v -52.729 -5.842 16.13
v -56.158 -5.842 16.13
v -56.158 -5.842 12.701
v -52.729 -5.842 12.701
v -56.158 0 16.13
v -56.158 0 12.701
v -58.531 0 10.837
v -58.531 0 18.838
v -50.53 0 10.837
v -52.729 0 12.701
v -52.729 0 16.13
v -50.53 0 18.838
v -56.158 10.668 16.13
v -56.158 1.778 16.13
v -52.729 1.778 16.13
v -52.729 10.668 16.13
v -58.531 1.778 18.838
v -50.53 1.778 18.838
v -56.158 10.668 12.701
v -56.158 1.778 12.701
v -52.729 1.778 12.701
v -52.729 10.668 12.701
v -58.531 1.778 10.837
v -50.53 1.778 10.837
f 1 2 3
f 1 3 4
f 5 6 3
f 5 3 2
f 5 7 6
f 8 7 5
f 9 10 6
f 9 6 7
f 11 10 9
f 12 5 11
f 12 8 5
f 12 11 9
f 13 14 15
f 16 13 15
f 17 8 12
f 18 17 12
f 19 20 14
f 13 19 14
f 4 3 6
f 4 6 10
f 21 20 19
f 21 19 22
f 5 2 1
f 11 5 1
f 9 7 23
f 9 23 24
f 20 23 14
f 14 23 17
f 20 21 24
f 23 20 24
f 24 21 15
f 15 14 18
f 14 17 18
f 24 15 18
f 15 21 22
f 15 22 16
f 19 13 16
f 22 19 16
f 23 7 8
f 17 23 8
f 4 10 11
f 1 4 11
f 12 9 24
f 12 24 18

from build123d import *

# Parameters (mm, degrees)
F0_W          = 3.429
F0_H          = 3.429
F1_DEPTH      = 5.842
F1_DEPTH_BACK = 10.668
F0_W_2        = 8.001
F0_H_2        = 8.001
F2_DEPTH      = 1.778


with BuildPart() as f1:
    # F0 (on Front) → F1 (new body, two sides)
    with BuildSketch(Plane.XZ) as f1_sk:
        with Locations((-54.44314, 14.415071)):
            Rectangle(F0_W, F0_H)
    extrude(amount=F1_DEPTH)
    extrude(f1_sk.sketch, amount=-F1_DEPTH_BACK)

    # F0 (on Front) → F2 (join)
    with BuildSketch(Plane.XZ):
        with Locations((-54.53074, 14.837216)):
            Rectangle(F0_W_2, F0_H_2)
        with Locations((-54.44314, 14.415071)):
            Rectangle(F0_W, F0_H, mode=Mode.SUBTRACT)
    extrude(amount=-F2_DEPTH)


solid = f1.part
